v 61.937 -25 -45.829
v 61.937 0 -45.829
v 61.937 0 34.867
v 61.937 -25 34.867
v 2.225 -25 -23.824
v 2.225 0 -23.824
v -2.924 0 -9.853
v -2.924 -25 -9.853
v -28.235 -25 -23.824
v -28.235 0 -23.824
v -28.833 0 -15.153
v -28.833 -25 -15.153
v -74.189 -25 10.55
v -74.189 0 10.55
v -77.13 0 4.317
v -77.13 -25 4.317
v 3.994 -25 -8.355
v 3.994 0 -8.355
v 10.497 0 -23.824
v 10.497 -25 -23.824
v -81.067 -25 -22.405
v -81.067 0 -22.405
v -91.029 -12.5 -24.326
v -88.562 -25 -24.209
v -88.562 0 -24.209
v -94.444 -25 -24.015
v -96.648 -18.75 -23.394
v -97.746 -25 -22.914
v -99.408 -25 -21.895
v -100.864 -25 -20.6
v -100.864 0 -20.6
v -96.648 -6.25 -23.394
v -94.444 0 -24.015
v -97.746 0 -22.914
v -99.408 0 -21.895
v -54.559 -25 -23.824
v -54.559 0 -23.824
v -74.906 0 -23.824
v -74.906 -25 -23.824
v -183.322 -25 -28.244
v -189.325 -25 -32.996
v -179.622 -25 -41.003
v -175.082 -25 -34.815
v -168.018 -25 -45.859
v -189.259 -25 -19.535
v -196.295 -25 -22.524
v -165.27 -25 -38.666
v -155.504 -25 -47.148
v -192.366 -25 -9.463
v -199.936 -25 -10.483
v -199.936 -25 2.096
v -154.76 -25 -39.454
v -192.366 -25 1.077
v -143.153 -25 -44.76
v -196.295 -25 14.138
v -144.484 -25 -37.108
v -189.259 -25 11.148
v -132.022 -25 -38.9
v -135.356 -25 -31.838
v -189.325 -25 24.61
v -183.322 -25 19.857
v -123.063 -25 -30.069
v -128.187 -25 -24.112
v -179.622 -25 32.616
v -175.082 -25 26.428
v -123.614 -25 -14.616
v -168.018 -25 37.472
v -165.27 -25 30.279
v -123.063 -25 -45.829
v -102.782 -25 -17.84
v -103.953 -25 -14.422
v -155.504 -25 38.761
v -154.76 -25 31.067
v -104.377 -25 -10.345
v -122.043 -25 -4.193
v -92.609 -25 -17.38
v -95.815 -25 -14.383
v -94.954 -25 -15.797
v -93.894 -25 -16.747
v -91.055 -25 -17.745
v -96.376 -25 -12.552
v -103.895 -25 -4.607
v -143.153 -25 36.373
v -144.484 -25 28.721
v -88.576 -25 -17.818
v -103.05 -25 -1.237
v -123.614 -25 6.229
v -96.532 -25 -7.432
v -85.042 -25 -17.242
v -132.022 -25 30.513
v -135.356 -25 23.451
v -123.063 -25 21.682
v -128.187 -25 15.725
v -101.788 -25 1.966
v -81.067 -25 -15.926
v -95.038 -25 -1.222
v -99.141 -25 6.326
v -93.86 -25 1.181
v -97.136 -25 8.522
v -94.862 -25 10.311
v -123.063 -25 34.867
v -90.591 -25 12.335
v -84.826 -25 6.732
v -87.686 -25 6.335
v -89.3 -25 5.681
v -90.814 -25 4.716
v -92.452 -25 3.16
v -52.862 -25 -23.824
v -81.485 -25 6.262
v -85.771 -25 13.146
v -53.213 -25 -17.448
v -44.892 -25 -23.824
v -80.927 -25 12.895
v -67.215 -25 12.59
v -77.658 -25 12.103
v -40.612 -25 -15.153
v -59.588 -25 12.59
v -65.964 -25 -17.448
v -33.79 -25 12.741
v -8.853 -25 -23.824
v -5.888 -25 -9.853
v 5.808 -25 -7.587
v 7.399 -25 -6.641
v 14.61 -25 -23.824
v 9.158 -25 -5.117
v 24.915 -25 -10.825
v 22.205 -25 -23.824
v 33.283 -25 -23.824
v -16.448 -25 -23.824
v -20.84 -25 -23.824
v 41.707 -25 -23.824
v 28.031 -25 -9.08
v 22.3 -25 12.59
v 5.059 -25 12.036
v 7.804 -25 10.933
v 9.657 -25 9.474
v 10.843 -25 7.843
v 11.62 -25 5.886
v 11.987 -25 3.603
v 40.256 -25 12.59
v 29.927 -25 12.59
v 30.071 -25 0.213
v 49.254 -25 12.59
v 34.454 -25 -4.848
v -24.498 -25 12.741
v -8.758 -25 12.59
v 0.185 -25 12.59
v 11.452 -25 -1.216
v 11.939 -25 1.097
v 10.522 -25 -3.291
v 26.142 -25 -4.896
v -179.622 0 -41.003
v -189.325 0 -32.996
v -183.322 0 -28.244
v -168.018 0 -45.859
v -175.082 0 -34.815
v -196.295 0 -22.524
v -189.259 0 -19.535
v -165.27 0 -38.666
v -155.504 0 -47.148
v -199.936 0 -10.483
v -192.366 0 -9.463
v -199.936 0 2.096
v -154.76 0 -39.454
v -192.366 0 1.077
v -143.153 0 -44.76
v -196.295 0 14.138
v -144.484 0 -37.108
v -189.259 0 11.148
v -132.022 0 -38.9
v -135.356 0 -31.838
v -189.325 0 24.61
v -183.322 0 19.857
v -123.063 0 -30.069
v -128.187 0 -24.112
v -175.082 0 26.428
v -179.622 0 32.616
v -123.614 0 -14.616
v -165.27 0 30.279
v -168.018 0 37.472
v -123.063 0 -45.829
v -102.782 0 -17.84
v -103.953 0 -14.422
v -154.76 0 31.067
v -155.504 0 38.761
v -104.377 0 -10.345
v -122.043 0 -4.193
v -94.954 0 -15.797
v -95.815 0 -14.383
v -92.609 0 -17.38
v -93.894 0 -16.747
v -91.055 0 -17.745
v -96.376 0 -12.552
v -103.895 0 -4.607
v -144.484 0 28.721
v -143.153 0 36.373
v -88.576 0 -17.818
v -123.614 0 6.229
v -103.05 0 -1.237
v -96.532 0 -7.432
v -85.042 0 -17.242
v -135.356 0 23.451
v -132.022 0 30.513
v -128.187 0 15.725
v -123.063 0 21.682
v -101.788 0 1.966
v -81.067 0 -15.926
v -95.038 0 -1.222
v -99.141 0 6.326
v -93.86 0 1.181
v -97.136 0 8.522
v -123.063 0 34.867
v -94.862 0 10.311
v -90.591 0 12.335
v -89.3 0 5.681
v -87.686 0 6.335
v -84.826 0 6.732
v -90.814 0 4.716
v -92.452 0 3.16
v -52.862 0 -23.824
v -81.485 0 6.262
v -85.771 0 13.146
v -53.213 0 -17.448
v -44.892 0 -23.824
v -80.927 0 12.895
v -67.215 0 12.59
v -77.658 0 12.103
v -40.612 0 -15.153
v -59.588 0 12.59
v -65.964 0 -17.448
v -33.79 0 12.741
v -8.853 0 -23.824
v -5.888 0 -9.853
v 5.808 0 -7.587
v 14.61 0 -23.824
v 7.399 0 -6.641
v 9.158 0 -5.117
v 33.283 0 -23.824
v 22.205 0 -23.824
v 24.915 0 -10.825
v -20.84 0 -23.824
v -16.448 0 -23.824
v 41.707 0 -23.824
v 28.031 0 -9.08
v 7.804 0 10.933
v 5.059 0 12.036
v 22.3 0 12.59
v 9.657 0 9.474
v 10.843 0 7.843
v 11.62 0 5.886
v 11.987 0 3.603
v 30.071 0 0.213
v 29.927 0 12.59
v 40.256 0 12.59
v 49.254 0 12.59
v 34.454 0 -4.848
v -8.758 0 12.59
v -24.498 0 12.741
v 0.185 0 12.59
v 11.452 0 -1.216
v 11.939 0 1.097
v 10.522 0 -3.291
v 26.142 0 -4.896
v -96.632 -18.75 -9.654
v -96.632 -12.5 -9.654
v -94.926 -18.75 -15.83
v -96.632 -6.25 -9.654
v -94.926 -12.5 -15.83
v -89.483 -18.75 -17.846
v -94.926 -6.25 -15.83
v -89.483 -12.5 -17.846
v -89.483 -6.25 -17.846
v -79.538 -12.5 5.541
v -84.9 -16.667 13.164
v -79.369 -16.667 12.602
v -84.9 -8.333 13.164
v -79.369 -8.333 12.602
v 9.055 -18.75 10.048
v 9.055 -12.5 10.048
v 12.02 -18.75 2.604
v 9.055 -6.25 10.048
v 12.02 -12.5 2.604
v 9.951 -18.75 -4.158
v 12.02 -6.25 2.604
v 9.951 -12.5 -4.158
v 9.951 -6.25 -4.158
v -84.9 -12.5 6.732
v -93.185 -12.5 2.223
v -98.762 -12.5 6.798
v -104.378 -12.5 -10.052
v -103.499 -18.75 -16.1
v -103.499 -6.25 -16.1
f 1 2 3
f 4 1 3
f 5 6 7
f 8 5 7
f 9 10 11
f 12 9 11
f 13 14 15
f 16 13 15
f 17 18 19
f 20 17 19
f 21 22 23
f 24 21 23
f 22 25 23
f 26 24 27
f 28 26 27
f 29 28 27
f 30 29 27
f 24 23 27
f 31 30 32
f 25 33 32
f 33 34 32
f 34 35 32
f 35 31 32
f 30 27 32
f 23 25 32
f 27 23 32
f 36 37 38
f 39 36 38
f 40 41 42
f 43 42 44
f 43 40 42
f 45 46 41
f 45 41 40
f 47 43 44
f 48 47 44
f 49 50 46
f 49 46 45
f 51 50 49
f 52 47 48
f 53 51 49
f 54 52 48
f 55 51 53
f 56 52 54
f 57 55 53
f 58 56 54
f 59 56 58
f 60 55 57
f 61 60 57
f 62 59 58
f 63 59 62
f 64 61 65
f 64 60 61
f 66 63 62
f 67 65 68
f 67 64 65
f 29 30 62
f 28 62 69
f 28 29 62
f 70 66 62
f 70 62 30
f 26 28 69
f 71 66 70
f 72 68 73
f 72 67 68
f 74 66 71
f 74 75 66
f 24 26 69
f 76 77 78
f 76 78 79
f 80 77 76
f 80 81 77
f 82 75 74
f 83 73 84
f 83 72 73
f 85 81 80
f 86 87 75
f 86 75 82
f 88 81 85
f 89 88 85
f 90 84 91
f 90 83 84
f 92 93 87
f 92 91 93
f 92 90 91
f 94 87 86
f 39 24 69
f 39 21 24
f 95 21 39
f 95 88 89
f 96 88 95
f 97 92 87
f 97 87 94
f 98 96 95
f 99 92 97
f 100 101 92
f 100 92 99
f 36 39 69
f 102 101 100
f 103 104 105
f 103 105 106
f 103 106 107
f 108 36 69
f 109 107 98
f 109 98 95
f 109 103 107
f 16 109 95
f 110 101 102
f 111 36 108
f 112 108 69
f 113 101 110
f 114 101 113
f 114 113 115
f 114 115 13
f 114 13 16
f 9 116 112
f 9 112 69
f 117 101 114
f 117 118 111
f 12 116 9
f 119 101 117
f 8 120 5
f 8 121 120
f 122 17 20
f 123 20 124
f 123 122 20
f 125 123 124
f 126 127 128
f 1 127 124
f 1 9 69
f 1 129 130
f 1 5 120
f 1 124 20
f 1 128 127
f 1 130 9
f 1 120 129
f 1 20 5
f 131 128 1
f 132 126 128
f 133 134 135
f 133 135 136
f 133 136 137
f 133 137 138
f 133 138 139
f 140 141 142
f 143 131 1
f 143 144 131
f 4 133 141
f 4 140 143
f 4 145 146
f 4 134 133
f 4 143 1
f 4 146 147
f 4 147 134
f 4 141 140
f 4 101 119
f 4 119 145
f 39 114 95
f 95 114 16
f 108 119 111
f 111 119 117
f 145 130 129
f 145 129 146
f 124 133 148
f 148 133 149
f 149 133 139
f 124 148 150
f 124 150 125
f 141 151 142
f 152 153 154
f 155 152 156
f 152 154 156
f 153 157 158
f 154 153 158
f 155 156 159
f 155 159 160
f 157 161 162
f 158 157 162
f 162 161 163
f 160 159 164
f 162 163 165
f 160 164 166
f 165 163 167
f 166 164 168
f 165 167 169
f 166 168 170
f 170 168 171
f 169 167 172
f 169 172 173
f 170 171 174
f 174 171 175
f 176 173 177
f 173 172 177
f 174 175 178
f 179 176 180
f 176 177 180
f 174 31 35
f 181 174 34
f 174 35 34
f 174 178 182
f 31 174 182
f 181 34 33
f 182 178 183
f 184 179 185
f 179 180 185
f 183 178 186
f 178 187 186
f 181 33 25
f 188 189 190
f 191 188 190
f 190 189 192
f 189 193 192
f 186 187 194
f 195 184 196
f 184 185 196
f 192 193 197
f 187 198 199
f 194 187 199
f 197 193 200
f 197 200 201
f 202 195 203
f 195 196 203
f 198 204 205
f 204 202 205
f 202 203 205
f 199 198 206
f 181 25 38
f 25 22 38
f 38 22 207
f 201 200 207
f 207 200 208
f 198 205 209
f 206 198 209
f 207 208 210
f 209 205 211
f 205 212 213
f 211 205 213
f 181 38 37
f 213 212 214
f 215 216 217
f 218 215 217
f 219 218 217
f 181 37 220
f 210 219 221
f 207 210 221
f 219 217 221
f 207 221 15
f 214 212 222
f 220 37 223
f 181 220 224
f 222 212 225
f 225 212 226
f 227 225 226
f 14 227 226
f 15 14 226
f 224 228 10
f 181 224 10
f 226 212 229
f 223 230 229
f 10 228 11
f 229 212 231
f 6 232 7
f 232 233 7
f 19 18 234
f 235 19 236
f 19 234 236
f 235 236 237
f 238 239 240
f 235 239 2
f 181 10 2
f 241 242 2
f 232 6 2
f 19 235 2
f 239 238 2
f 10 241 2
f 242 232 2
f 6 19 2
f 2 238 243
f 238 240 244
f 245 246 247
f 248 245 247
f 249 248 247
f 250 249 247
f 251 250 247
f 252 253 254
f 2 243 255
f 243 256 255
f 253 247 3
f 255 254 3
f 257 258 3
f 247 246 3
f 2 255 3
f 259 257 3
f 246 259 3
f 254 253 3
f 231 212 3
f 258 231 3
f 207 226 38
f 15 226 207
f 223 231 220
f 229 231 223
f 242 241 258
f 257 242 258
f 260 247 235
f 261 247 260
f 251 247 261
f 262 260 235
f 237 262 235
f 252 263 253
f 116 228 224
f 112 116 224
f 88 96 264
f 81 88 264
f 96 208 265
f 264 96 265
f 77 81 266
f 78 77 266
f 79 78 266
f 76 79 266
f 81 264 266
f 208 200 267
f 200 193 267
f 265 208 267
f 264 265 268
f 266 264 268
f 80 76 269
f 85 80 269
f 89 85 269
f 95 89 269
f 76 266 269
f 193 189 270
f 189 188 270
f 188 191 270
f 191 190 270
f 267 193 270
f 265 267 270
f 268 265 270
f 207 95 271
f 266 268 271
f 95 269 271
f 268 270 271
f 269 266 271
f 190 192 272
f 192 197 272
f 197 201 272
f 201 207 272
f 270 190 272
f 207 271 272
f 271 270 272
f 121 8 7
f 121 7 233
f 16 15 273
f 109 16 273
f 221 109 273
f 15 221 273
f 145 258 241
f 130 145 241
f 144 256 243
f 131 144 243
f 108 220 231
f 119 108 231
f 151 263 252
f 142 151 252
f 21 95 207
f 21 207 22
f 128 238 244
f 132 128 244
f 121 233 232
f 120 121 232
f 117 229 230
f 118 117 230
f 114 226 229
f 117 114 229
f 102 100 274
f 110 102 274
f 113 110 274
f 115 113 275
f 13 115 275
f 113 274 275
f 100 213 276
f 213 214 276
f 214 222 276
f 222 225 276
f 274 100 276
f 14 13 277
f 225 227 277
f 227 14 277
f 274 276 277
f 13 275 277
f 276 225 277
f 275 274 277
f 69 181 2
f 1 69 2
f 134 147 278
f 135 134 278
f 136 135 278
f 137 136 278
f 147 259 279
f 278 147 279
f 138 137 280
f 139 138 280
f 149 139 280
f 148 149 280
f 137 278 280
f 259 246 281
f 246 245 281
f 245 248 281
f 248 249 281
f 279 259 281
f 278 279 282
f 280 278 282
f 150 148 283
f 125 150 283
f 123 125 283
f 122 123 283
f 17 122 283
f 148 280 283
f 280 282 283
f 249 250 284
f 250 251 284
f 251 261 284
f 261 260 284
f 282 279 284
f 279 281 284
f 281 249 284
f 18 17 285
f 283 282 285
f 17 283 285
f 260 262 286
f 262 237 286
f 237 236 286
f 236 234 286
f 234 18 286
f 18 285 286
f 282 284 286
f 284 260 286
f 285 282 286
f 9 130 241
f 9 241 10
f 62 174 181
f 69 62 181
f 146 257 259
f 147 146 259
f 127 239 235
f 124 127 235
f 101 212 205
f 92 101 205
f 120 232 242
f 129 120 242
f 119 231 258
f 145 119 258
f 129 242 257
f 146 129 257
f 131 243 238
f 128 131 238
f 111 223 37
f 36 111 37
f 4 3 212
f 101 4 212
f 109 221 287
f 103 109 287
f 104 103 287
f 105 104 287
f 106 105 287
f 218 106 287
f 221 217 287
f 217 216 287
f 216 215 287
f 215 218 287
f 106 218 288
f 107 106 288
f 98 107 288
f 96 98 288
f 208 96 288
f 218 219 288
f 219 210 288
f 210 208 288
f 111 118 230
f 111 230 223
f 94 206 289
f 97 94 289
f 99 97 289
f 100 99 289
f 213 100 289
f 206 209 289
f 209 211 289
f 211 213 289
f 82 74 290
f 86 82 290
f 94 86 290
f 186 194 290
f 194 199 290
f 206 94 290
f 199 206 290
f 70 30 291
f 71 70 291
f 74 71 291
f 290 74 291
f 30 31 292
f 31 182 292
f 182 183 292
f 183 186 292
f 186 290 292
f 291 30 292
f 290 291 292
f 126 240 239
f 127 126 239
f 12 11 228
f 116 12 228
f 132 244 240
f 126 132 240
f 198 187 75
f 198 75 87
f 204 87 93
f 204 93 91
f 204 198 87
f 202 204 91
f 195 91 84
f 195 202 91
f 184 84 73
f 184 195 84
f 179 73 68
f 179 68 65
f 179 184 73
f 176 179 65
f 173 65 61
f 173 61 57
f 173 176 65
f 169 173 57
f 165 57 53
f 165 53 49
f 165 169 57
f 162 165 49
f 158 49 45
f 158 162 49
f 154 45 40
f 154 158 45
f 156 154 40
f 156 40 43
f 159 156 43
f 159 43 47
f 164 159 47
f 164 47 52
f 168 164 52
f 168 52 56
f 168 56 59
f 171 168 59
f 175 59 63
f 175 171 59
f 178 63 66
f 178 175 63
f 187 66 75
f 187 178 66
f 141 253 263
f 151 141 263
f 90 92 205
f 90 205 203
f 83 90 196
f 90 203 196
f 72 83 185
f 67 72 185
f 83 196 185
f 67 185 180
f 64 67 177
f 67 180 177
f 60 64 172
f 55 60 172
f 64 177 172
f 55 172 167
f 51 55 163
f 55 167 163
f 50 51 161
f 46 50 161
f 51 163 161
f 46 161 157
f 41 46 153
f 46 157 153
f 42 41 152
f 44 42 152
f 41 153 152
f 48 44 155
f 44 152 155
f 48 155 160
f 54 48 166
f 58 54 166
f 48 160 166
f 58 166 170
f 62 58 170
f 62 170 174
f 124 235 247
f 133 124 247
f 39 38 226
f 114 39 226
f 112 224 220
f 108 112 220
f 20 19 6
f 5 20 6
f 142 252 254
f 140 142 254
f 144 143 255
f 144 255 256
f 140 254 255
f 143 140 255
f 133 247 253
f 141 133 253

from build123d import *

# Parameters (mm, degrees)
F0_R     = 35.3591127091
F1_DEPTH = 25


with BuildPart() as f1:
    # F0 (on Front) → F1 (new body)
    with BuildSketch(Plane.XZ):
        with BuildLine():
            Line((61.9367249054, 34.8669122506), (-123.0632750946, 34.8669122506))
            Line((-123.0632750946, 34.8669122506), (-123.0632750946, 21.6819903858))
            ThreePointArc((-123.0632750946, 21.6819903858), (-116.6274794012, 9.4492653106), (-114.4056740389, -4.193410743))
            ThreePointArc((-114.4056740389, -4.193410743), (-116.6274794012, -17.8360867967), (-123.0632750946, -30.0688118719))
            Line((-123.0632750946, -30.0688118719), (-123.0632750946, -45.8291395163))
            Line((-123.0632750946, -45.8291395163), (61.9367249054, -45.8291395163))
            Line((61.9367249054, -45.8291395163), (61.9367249054, 34.8669122506))
        make_face()
        with BuildLine():
            add(Edge.make_bspline(
                [(-81.4851504642, 6.2619487625), (-83.2026240645, 6.7321619524), (-84.9001733771, 6.7321619524)],
                knots=[0, 0, 0, 1, 1, 1], degree=2))
            add(Edge.make_bspline(
                [(-84.9001733771, 6.7321619524), (-88.1836959912, 6.7321619524), (-90.8137019684, 4.7158240365)],
                knots=[0, 0, 0, 1, 1, 1], degree=2))
            add(Edge.make_bspline(
                [(-90.8137019684, 4.7158240365), (-93.4437079457, 2.6994861206), (-95.0376509623, -1.2216137001)],
                knots=[0, 0, 0, 1, 1, 1], degree=2))
            add(Edge.make_bspline(
                [(-95.0376509623, -1.2216137001), (-96.6315939788, -5.1427135208), (-96.6315939788, -9.6535722576)],
                knots=[0, 0, 0, 1, 1, 1], degree=2))
            add(Edge.make_bspline(
                [(-96.6315939788, -9.6535722576), (-96.6315939788, -13.8137635308), (-94.9260749511, -15.8301014467)],
                knots=[0, 0, 0, 1, 1, 1], degree=2))
            add(Edge.make_bspline(
                [(-94.9260749511, -15.8301014467), (-93.2205559234, -17.8464393626), (-89.4827595496, -17.8464393626)],
                knots=[0, 0, 0, 1, 1, 1], degree=2))
            add(Edge.make_bspline(
                [(-89.4827595496, -17.8464393626), (-85.8485694719, -17.8464393626), (-81.0667404223, -15.9257380277)],
                knots=[0, 0, 0, 1, 1, 1], degree=2))
            Line((-81.0667404223, -15.9257380277), (-81.0667404223, -22.4051163899))
            add(Edge.make_bspline(
                [(-81.0667404223, -22.4051163899), (-86.0159334887, -24.3258177248), (-91.0288842757, -24.3258177248)],
                knots=[0, 0, 0, 1, 1, 1], degree=2))
            add(Edge.make_bspline(
                [(-91.0288842757, -24.3258177248), (-97.3488683362, -24.3258177248), (-100.8635126877, -20.5999759237)],
                knots=[0, 0, 0, 1, 1, 1], degree=2))
            add(Edge.make_bspline(
                [(-100.8635126877, -20.5999759237), (-104.3781570392, -16.8741341225), (-104.3781570392, -10.0520580117)],
                knots=[0, 0, 0, 1, 1, 1], degree=2))
            add(Edge.make_bspline(
                [(-104.3781570392, -10.0520580117), (-104.3781570392, -3.524861359), (-101.7879996373, 1.9662723329)],
                knots=[0, 0, 0, 1, 1, 1], degree=2))
            add(Edge.make_bspline(
                [(-101.7879996373, 1.9662723329), (-99.1978422354, 7.4574060249), (-94.8623172304, 10.3105640245)],
                knots=[0, 0, 0, 1, 1, 1], degree=2))
            add(Edge.make_bspline(
                [(-94.8623172304, 10.3105640245), (-90.5267922255, 13.1637220241), (-84.9001733771, 13.1637220241)],
                knots=[0, 0, 0, 1, 1, 1], degree=2))
            add(Edge.make_bspline(
                [(-84.9001733771, 13.1637220241), (-81.7840147798, 13.1637220241), (-79.3691911097, 12.6018571108)],
                knots=[0, 0, 0, 1, 1, 1], degree=2))
            add(Edge.make_bspline(
                [(-79.3691911097, 12.6018571108), (-76.9543674396, 12.0399921975), (-74.188876306, 10.549655477)],
                knots=[0, 0, 0, 1, 1, 1], degree=2))
            Line((-74.188876306, 10.549655477), (-77.1297011715, 4.3173382823))
            add(Edge.make_bspline(
                [(-77.1297011715, 4.3173382823), (-79.7676768638, 5.7917355726), (-81.4851504642, 6.2619487625)],
                knots=[0, 0, 0, 1, 1, 1], degree=2))
        make_face(mode=Mode.SUBTRACT)
        Polygon((-54.5594680573, -23.8237256746), (-74.9061506634, -23.8237256746), (-67.2153756086, 12.5899025382), (-59.5883582745, 12.5899025382), (-65.9641303406, -17.4479536085), (-53.2125862083, -17.4479536085), align=None, mode=Mode.SUBTRACT)
        Polygon((-28.2354991392, -23.8237256746), (-28.8332277704, -15.1526756647), (-40.6124666626, -15.1526756647), (-44.892203662, -23.8237256746), (-52.8619187447, -23.8237256746), (-33.7903905518, 12.7413271247), (-24.4977027654, 12.7413271247), (-20.8396035425, -23.8237256746), align=None, mode=Mode.SUBTRACT)
        with BuildLine():
            Line((-2.9236840366, -9.8528151347), (-5.8884180473, -9.8528151347))
            Line((-5.8884180473, -9.8528151347), (-8.8531520581, -23.8237256746))
            Line((-8.8531520581, -23.8237256746), (-16.4482905319, -23.8237256746))
            Line((-16.4482905319, -23.8237256746), (-8.7575154771, 12.5899025382))
            Line((-8.7575154771, 12.5899025382), (0.1845048457, 12.5899025382))
            add(Edge.make_bspline(
                [(0.1845048457, 12.5899025382), (6.0900637219, 12.5899025382), (9.0547977327, 10.0475634268)],
                knots=[0, 0, 0, 1, 1, 1], degree=2))
            add(Edge.make_bspline(
                [(9.0547977327, 10.0475634268), (12.0195317435, 7.5052243154), (12.0195317435, 2.6038495396)],
                knots=[0, 0, 0, 1, 1, 1], degree=2))
            add(Edge.make_bspline(
                [(12.0195317435, 2.6038495396), (12.0195317435, -1.3331897113), (9.9513906795, -4.1584537081)],
                knots=[0, 0, 0, 1, 1, 1], degree=2))
            add(Edge.make_bspline(
                [(9.9513906795, -4.1584537081), (7.8832496155, -6.9837177049), (3.9940286552, -8.3545086991)],
                knots=[0, 0, 0, 1, 1, 1], degree=2))
            Line((3.9940286552, -8.3545086991), (10.4973161627, -23.8237256746))
            Line((10.4973161627, -23.8237256746), (2.2247519068, -23.8237256746))
            Line((2.2247519068, -23.8237256746), (-2.9236840366, -9.8528151347))
        make_face(mode=Mode.SUBTRACT)
        Polygon((34.4542797012, -4.8478340628), (41.7067204265, -23.8237256746), (33.2827315841, -23.8237256746), (28.0306893446, -9.0797527717), (24.9145307472, -10.8251203748), (22.2048276191, -23.8237256746), (14.6096891453, -23.8237256746), (22.3004642001, 12.5899025382), (29.9274815343, 12.5899025382), (26.14186687, -4.8956523532), (30.0709364057, 0.2129350148), (40.2562322814, 12.5899025382), (49.2540406098, 12.5899025382), align=None, mode=Mode.SUBTRACT)
        with BuildLine():
            ThreePointArc((-114.4056740389, -4.193410743), (-116.6274794012, 9.4492653106), (-123.0632750946, 21.6819903858))
            ThreePointArc((-123.0632750946, 21.6819903858), (-200.3983681841, -4.193410743), (-123.0632750946, -30.0688118719))
            ThreePointArc((-123.0632750946, -30.0688118719), (-116.6274794012, -17.8360867967), (-114.4056740389, -4.193410743))
        make_face()
        with Locations((-157.4020211115, -4.193410743)):
            Circle(F0_R, mode=Mode.SUBTRACT)
    extrude(amount=F1_DEPTH)


solid = f1.part
